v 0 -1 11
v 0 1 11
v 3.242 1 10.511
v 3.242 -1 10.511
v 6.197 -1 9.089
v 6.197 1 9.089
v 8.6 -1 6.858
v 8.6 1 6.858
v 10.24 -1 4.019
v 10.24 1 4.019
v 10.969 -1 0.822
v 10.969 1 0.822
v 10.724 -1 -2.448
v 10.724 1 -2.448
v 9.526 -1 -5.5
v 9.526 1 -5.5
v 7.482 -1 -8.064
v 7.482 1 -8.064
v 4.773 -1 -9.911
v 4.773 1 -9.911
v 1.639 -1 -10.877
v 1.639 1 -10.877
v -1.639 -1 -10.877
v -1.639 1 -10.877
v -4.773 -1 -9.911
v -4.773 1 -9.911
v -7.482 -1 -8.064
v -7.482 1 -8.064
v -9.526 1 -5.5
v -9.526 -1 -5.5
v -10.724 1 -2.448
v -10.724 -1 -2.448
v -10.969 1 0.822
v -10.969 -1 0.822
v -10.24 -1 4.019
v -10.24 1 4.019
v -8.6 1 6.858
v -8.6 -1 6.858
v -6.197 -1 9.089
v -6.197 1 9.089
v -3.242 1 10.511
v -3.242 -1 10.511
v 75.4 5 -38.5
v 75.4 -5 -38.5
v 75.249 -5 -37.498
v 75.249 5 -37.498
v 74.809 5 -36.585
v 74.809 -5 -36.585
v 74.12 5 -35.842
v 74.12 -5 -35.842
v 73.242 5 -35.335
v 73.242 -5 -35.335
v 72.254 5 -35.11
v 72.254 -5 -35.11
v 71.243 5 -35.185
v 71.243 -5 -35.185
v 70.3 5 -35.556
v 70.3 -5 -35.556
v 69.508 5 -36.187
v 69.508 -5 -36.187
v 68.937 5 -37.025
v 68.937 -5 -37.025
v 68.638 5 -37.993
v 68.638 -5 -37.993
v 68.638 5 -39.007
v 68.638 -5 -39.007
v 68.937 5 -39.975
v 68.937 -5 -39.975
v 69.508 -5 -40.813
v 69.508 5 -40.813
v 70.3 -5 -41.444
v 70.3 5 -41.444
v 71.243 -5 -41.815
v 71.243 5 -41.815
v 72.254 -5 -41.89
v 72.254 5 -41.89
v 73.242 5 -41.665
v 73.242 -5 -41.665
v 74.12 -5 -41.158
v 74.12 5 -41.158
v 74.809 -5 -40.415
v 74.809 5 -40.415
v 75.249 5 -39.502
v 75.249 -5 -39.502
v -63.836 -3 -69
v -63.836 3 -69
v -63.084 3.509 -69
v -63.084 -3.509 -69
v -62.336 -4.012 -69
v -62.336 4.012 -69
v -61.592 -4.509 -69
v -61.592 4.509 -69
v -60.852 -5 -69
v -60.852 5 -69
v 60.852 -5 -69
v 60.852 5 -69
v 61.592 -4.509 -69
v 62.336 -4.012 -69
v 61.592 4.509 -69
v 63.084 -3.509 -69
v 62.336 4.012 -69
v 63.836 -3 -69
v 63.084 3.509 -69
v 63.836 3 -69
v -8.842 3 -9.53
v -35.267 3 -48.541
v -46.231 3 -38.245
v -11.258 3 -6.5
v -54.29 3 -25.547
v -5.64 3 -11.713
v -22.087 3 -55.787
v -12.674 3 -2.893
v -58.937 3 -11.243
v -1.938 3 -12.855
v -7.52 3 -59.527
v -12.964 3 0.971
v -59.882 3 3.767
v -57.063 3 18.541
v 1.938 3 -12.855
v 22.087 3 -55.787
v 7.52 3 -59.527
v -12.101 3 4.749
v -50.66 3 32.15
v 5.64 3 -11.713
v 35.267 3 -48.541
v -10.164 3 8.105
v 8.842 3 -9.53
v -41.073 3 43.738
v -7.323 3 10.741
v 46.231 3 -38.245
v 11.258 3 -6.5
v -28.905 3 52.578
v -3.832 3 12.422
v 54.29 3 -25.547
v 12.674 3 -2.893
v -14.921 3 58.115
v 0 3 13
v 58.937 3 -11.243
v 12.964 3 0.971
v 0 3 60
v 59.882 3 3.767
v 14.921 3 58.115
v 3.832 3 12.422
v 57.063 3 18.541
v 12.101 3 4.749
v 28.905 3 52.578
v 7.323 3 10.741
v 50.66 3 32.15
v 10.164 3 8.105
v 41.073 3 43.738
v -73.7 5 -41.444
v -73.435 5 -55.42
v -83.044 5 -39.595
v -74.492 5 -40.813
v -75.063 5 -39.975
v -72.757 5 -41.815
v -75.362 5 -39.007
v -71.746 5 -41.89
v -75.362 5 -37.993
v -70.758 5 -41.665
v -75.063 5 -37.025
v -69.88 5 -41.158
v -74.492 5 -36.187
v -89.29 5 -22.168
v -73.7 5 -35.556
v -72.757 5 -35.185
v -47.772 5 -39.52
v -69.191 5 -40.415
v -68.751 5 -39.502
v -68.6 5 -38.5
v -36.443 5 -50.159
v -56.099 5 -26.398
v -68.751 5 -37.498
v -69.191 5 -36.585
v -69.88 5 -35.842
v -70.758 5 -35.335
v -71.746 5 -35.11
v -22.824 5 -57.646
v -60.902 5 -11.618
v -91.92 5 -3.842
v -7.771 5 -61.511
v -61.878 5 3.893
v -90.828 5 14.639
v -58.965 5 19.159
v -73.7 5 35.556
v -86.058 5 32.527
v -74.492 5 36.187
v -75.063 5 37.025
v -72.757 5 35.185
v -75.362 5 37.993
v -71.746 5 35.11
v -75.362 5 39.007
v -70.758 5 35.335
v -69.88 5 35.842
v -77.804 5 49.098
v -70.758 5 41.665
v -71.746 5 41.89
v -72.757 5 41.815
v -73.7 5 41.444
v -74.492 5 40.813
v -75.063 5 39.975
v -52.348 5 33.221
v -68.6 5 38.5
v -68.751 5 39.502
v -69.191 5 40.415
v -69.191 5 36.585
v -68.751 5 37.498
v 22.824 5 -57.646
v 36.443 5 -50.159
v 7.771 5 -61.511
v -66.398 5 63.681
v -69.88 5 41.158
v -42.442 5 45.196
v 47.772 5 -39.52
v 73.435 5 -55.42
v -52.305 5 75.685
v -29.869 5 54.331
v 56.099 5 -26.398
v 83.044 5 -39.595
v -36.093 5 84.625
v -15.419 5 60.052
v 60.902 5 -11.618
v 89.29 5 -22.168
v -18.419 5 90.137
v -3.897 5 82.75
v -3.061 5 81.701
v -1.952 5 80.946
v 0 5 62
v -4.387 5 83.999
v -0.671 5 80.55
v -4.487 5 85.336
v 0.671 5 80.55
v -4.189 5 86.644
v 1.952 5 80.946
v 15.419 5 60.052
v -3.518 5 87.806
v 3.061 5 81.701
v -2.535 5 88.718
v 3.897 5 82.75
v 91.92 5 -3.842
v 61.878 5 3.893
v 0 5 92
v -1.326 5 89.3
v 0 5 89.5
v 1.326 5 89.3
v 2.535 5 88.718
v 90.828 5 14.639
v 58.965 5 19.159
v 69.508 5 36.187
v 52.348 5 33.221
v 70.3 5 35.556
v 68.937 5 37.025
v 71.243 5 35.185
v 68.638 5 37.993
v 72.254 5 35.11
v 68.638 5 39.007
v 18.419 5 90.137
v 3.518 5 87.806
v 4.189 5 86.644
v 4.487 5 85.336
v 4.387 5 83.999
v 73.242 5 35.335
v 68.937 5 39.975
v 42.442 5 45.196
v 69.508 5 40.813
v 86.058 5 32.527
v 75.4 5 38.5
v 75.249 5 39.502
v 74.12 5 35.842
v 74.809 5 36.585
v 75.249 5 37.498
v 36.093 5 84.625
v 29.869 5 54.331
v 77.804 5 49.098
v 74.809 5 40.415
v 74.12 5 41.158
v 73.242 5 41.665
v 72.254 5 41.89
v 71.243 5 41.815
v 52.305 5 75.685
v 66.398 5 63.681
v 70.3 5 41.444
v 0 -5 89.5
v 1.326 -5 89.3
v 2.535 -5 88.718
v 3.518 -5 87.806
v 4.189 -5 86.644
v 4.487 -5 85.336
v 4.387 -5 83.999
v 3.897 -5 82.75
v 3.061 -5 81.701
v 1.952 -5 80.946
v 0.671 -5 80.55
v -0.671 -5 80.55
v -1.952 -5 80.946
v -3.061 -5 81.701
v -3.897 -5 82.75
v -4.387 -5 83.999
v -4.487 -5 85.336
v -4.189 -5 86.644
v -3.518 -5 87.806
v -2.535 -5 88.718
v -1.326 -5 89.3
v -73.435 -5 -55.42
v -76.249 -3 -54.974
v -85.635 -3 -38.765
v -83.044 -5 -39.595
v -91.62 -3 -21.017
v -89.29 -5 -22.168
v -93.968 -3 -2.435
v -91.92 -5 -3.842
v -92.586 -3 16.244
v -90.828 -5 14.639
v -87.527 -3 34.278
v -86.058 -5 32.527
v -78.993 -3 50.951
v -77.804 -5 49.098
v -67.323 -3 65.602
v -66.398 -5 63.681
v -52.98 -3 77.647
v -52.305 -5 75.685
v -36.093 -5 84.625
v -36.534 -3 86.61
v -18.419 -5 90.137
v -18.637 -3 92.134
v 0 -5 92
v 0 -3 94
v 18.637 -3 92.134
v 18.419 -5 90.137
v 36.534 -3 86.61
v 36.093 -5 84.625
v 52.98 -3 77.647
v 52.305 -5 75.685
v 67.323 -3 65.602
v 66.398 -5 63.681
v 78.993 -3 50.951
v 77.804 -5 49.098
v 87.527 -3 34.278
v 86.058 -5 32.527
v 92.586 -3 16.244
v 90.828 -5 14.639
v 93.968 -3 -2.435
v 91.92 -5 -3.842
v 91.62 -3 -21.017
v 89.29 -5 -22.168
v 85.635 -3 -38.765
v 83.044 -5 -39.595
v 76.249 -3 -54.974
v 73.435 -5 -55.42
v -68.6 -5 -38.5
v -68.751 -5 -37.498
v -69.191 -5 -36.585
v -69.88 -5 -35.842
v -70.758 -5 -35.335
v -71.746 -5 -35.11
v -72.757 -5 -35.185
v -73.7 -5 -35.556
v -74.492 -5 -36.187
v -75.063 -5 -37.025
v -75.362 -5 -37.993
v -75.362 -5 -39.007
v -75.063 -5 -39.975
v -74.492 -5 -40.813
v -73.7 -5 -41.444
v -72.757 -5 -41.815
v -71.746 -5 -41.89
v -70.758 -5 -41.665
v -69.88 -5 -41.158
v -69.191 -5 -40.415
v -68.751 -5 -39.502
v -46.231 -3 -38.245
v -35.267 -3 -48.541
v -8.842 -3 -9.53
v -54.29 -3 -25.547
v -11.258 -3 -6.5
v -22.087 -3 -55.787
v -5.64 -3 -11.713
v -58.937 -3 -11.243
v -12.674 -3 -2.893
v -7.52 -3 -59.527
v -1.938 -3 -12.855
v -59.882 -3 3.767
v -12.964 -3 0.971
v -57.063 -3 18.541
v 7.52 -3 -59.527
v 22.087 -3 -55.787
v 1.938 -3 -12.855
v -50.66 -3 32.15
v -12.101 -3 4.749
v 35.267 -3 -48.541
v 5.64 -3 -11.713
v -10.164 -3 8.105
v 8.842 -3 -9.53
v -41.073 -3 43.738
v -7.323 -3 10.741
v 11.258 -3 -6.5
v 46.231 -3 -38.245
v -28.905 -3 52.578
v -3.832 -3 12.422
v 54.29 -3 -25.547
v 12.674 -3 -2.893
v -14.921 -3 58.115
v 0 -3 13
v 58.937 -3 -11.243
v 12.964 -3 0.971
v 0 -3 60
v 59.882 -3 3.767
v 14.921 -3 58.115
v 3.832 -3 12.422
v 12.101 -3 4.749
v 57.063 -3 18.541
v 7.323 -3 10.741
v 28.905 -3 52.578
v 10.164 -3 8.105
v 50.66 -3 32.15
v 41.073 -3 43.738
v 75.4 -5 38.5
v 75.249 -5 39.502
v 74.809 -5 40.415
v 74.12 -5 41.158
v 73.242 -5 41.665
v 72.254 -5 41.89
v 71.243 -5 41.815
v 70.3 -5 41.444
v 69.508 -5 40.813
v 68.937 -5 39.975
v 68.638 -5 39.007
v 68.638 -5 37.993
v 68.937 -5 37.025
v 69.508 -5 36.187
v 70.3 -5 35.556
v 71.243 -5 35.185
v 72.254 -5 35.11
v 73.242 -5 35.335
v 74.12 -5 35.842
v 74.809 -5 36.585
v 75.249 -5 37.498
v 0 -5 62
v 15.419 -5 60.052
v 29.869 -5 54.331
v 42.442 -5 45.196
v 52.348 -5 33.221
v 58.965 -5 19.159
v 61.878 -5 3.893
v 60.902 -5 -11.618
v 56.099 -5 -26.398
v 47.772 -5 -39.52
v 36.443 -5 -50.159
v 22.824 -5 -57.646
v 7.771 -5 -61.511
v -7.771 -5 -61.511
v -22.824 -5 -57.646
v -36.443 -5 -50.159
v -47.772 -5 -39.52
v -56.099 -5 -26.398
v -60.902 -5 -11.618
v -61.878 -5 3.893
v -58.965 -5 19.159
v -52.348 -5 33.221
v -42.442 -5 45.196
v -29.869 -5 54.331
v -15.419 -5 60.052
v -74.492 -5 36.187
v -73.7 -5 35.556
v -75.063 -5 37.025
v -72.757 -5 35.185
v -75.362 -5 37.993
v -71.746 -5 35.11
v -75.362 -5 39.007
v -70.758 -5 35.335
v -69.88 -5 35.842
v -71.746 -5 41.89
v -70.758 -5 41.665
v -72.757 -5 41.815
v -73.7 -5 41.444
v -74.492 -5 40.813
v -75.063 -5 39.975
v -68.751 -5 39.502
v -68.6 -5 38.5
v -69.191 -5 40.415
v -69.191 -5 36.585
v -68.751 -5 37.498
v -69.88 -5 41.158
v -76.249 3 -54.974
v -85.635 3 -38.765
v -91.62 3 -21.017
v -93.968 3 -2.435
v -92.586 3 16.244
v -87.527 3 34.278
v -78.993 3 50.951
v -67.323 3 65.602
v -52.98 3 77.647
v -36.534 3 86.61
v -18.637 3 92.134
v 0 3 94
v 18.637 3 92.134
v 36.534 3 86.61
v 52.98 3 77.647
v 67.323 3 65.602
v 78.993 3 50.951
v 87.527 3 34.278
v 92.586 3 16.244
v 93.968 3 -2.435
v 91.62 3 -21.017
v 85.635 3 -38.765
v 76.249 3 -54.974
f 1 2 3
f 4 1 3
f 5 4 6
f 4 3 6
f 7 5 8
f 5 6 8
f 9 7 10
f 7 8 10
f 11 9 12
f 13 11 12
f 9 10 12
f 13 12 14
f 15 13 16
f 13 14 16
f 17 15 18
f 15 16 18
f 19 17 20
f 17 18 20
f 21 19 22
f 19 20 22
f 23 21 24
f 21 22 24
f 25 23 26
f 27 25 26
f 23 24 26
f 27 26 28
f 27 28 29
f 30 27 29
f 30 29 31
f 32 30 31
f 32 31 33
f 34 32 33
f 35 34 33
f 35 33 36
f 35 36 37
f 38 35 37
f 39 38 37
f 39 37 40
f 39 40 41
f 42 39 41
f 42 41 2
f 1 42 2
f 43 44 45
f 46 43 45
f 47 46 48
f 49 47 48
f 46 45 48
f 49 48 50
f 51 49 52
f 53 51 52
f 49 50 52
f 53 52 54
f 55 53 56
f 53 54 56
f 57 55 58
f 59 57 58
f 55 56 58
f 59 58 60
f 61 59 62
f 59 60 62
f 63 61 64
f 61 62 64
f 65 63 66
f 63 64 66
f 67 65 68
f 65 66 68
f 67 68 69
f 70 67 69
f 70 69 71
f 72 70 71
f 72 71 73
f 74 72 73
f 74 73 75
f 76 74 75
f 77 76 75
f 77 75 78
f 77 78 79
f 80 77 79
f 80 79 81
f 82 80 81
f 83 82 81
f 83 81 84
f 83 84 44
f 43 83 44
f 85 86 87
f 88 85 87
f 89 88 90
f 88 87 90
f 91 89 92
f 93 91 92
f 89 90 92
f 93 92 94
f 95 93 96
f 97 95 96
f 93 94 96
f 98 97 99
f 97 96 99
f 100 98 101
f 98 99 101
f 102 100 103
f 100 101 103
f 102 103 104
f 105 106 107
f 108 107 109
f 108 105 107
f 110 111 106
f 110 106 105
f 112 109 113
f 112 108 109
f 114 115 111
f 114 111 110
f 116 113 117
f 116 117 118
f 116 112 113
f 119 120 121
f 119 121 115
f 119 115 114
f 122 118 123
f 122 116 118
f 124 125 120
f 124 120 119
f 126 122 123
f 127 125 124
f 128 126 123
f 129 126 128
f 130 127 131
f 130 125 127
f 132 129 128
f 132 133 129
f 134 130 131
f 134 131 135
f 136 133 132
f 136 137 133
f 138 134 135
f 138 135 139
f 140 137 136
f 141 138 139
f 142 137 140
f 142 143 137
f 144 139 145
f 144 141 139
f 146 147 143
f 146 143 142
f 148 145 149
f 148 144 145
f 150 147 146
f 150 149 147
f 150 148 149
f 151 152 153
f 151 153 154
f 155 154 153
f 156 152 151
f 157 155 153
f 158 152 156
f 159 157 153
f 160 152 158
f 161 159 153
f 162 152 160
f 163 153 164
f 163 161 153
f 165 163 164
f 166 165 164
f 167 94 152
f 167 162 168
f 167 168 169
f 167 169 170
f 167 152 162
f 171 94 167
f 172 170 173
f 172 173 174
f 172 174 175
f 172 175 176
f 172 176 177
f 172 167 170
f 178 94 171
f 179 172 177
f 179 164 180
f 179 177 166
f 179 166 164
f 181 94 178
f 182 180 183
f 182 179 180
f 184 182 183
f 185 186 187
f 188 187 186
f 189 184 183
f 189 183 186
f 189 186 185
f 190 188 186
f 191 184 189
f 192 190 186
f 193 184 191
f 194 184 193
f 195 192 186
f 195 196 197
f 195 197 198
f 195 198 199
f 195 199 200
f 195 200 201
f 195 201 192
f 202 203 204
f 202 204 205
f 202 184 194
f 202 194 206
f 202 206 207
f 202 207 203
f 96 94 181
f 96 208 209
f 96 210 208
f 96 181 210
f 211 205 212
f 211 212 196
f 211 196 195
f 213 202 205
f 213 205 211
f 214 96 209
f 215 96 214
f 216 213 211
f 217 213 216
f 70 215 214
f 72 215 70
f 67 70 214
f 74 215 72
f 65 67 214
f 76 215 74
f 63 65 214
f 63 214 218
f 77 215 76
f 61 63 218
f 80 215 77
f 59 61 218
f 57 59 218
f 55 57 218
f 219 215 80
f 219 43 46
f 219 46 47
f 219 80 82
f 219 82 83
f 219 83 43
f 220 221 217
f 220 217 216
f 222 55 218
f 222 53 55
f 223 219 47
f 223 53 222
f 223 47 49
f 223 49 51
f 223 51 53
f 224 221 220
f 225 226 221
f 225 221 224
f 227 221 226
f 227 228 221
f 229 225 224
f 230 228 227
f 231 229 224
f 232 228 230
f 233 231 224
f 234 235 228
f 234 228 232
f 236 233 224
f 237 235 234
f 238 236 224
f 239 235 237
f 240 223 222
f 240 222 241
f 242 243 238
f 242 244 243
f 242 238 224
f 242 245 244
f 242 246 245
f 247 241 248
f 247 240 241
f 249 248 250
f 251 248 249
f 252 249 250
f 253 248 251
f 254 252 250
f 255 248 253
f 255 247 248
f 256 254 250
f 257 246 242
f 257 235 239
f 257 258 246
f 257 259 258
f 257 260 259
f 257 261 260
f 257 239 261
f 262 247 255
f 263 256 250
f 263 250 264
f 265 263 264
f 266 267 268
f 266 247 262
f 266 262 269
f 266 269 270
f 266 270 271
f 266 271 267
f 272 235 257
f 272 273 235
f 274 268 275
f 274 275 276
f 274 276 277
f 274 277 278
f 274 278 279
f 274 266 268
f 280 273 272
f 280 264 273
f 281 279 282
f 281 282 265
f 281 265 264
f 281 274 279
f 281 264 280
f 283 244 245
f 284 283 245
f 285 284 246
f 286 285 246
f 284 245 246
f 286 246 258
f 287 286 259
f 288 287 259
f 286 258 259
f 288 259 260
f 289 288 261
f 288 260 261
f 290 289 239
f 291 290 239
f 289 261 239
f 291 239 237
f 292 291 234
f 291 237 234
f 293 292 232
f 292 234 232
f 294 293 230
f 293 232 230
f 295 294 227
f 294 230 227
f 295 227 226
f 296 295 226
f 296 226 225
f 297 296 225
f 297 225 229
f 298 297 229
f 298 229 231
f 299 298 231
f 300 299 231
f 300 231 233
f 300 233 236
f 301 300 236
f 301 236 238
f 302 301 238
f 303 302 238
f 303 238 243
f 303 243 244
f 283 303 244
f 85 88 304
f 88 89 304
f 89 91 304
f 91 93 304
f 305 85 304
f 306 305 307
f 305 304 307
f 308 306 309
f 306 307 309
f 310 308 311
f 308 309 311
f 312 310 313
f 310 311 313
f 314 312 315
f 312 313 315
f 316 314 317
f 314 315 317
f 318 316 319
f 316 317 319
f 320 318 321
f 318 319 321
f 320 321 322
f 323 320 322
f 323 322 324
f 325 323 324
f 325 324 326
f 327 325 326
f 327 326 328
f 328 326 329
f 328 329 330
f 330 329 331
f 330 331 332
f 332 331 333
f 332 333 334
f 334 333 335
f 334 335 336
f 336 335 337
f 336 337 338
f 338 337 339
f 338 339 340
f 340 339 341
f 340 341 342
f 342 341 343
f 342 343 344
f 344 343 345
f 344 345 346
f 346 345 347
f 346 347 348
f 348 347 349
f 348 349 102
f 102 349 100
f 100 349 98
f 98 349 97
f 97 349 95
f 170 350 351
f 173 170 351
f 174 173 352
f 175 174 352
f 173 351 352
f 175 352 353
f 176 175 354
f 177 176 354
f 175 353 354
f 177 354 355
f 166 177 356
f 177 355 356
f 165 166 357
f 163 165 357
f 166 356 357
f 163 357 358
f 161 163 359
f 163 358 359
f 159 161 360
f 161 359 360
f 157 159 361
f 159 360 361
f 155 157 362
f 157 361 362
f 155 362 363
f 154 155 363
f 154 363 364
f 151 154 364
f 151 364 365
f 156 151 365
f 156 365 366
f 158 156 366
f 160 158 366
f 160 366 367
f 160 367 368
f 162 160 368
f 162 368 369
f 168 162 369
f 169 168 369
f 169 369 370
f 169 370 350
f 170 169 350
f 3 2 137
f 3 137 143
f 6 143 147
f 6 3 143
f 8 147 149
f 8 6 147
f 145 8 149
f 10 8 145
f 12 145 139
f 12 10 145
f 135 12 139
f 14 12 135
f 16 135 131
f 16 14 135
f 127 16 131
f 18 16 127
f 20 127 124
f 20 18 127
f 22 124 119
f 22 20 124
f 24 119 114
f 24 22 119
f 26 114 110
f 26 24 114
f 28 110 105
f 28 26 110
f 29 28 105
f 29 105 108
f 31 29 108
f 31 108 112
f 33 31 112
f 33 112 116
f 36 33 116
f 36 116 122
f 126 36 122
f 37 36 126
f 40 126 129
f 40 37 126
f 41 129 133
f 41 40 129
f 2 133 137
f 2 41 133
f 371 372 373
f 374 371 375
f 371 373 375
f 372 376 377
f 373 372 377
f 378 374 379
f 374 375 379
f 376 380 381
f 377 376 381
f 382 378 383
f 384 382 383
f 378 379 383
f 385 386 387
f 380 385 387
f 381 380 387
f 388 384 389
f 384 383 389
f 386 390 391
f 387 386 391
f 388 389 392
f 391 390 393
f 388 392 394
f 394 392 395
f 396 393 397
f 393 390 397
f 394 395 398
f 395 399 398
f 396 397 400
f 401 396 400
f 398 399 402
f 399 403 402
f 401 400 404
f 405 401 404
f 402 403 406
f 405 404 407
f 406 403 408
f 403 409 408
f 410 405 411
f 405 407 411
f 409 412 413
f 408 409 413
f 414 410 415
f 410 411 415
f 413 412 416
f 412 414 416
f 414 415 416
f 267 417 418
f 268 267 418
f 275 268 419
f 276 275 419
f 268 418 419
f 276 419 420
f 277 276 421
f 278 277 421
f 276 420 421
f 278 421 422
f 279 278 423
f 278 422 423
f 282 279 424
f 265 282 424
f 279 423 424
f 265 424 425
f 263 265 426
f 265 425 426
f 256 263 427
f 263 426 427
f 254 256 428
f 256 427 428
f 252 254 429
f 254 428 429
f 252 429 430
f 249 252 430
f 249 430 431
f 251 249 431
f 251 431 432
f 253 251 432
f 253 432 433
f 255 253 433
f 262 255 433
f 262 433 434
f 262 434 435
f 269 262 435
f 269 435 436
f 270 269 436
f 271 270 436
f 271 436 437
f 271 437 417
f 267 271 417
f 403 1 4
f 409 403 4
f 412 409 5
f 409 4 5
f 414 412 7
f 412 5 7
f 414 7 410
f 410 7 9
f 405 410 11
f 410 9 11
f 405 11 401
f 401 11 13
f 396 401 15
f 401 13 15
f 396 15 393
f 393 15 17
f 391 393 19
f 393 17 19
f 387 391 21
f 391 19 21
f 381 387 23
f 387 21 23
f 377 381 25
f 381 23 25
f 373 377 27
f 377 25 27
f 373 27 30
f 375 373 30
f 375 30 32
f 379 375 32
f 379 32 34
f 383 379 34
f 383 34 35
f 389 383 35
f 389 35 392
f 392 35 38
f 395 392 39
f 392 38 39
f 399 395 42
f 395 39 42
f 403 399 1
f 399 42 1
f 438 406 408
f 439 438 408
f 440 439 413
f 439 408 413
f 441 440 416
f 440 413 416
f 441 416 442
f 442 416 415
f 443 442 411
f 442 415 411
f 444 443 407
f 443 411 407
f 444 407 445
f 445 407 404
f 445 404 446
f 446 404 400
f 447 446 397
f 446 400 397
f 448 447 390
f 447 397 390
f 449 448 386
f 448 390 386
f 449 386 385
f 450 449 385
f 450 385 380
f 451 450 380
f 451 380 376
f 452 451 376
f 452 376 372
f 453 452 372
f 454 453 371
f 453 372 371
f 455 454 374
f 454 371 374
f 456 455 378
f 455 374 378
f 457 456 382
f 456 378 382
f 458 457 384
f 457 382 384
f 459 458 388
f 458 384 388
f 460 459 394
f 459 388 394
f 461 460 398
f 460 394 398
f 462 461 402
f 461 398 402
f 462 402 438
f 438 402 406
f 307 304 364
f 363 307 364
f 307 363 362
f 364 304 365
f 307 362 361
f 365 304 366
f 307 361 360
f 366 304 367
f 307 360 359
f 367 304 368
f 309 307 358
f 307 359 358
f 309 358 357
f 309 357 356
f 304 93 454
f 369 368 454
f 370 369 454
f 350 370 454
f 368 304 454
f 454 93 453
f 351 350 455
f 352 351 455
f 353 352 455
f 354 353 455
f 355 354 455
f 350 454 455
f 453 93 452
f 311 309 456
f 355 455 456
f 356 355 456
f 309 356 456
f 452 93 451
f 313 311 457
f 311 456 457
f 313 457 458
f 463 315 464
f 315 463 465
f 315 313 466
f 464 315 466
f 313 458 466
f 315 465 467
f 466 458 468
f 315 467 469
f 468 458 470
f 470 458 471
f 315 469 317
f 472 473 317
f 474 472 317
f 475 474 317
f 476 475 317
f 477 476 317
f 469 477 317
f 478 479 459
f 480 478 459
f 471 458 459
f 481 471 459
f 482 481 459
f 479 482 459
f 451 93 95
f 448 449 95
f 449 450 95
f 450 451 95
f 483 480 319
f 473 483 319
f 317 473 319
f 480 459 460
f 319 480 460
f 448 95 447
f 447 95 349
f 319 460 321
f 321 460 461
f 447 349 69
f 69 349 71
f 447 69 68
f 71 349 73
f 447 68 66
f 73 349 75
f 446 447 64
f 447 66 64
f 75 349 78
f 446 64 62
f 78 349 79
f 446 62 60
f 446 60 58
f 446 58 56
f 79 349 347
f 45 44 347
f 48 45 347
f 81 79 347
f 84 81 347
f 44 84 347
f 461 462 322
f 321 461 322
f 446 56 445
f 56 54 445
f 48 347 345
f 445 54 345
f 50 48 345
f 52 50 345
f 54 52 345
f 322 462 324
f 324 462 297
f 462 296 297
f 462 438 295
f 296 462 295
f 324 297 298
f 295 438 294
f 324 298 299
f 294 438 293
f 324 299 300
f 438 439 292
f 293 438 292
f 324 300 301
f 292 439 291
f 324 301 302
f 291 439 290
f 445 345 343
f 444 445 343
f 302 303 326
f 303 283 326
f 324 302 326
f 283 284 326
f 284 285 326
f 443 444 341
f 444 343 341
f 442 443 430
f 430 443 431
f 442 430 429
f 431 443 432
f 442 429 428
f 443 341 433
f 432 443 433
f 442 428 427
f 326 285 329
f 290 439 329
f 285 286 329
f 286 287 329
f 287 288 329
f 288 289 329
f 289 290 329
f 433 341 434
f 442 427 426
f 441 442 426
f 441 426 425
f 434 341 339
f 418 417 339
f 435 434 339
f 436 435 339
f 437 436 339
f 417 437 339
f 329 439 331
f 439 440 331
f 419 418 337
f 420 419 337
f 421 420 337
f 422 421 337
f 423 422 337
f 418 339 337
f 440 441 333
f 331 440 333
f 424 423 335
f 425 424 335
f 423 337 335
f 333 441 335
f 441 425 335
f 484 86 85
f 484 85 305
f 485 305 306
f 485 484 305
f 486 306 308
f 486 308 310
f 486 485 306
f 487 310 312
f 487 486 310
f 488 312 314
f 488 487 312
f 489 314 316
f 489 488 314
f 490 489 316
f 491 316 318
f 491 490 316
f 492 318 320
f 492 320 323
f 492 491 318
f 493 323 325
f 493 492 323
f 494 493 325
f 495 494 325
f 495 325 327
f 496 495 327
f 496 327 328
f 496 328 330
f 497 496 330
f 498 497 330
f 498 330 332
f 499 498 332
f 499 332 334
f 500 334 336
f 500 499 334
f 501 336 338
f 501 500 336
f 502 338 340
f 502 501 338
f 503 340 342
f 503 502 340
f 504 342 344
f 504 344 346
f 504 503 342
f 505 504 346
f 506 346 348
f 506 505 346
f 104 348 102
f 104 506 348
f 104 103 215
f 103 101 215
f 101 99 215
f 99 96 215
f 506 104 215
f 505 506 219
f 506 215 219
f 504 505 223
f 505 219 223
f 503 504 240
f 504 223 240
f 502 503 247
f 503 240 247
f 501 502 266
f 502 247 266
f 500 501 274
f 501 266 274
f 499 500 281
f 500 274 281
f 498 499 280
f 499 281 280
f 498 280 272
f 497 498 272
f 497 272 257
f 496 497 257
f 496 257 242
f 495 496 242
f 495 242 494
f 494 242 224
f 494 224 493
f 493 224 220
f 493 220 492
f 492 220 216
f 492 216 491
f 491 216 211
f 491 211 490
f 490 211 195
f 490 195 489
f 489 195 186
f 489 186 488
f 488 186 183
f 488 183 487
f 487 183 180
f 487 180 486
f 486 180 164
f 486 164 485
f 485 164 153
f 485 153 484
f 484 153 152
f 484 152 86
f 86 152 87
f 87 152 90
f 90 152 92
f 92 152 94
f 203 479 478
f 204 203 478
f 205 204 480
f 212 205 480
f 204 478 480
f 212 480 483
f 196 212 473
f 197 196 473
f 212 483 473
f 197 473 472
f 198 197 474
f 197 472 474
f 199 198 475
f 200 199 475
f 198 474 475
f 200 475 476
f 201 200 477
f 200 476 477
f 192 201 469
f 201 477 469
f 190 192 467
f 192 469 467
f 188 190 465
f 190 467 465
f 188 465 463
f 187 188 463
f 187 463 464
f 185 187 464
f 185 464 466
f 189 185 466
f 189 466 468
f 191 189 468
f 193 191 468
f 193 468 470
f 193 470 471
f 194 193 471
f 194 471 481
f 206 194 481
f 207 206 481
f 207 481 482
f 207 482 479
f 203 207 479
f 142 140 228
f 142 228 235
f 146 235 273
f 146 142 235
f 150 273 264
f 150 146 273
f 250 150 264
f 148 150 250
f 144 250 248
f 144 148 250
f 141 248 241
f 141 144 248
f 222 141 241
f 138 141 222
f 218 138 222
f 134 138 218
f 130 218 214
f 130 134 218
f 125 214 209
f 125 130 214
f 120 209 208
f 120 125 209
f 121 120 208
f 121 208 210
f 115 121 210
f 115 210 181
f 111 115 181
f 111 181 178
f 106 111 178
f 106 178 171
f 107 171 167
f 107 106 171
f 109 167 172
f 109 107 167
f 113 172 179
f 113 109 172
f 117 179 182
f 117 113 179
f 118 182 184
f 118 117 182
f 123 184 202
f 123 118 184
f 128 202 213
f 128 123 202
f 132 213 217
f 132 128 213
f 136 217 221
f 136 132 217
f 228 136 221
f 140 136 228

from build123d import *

# Parameters (mm, degrees)
SKETCH_2_R          = 94
EXTRUDE_1_DEPTH     = 5
SKETCH_3_W          = 204.518128244
SKETCH_3_H          = 25
CUT_EXTRUDE_1_DEPTH = 134.311664906
SKETCH_4_R          = 11
CUT_EXTRUDE_2_DEPTH = 134.311664906
SKETCH_5_R          = 60
CUT_EXTRUDE_3_DEPTH = 2
M8X1_25_1_D         = 6.8
M8X1_25_1_DEPTH     = 19.75
M8X1_25_1_TIP       = 2.042926105
SKETCH_8_R          = 4.5
CUT_EXTRUDE_4_DEPTH = 134.311664906
CHAMFER_1_SIZE      = 2


with BuildPart() as part:
    # 草图2 → 凸台-拉伸1 (new, symmetric)
    with BuildSketch(Plane(origin=(0, 0, 0), x_dir=(1, 0, 0), z_dir=(0, 1, 0))):
        with Locations(Location((0, 0, 0), (0, 0, 270))):
            Circle(SKETCH_2_R)
    extrude(amount=EXTRUDE_1_DEPTH, both=True)

    # 草图3 → 切除-拉伸1 (cut, through all)
    with BuildSketch(Plane(origin=(0, 5, 0), x_dir=(1, 0, 0), z_dir=(0, 1, 0))):
        with Locations((5.966826679, 81.5)):
            Rectangle(SKETCH_3_W, SKETCH_3_H)
    extrude(amount=-CUT_EXTRUDE_1_DEPTH, mode=Mode.SUBTRACT)

    # 草图4 → 切除-拉伸2 (cut, through all)
    with BuildSketch(Plane(origin=(0, 5, 0), x_dir=(1, 0, 0), z_dir=(0, 1, 0))):
        with Locations(Location((0, 0, 0), (0, 0, 270))):
            Circle(SKETCH_4_R)
    extrude(amount=-CUT_EXTRUDE_2_DEPTH, mode=Mode.SUBTRACT)

    # 草图5 → 切除-拉伸3 (cut)
    with BuildSketch(Plane(origin=(0, 5, 0), x_dir=(1, 0, 0), z_dir=(0, 1, 0))):
        with Locations(Location((0, 0, 0), (0, 0, 270))):
            Circle(SKETCH_5_R)
    cut_extrude_3 = extrude(amount=-CUT_EXTRUDE_3_DEPTH, mode=Mode.SUBTRACT)

    # 镜向1: 切除-拉伸3 across plane
    add(cut_extrude_3.mirror(Plane.ZX), mode=Mode.SUBTRACT)

    # M8x1.25 螺纹孔1
    with Locations(Plane(origin=(0, 5, 0), x_dir=(-1, 0, 0), z_dir=(0, 1, 0))):
        with Locations((72, -38.5), (-72, -38.5), (72, 38.5), (-72, 38.5)):
            Hole(M8X1_25_1_D / 2, depth=M8X1_25_1_DEPTH)
            with Locations((0, 0, -(M8X1_25_1_DEPTH + M8X1_25_1_TIP / 2))):  # 118° drill point
                Cone(0, M8X1_25_1_D / 2, M8X1_25_1_TIP, mode=Mode.SUBTRACT)

    # 草图8 → 切除-拉伸4 (cut, through all)
    with BuildSketch(Plane(origin=(0, 5, 0), x_dir=(1, 0, 0), z_dir=(0, 1, 0))):
        with Locations(Location((0, -85, 0), (0, 0, 270))):
            Circle(SKETCH_8_R)
    extrude(amount=-CUT_EXTRUDE_4_DEPTH, mode=Mode.SUBTRACT)

    # 倒角1
    chamfer_1_edges = [part.edges().sort_by_distance(p)[0] for p in [
        (0, 5, -60),
        (0, 3, -11),
        (0, -5, -60),
        (0, -3, -11),
        (0, -5, 94),
        (0, 5, 94),
    ]]
    chamfer(chamfer_1_edges, length=CHAMFER_1_SIZE - 0.0001)  # a hair under: the kernel refuses the full size


solid = part.part
